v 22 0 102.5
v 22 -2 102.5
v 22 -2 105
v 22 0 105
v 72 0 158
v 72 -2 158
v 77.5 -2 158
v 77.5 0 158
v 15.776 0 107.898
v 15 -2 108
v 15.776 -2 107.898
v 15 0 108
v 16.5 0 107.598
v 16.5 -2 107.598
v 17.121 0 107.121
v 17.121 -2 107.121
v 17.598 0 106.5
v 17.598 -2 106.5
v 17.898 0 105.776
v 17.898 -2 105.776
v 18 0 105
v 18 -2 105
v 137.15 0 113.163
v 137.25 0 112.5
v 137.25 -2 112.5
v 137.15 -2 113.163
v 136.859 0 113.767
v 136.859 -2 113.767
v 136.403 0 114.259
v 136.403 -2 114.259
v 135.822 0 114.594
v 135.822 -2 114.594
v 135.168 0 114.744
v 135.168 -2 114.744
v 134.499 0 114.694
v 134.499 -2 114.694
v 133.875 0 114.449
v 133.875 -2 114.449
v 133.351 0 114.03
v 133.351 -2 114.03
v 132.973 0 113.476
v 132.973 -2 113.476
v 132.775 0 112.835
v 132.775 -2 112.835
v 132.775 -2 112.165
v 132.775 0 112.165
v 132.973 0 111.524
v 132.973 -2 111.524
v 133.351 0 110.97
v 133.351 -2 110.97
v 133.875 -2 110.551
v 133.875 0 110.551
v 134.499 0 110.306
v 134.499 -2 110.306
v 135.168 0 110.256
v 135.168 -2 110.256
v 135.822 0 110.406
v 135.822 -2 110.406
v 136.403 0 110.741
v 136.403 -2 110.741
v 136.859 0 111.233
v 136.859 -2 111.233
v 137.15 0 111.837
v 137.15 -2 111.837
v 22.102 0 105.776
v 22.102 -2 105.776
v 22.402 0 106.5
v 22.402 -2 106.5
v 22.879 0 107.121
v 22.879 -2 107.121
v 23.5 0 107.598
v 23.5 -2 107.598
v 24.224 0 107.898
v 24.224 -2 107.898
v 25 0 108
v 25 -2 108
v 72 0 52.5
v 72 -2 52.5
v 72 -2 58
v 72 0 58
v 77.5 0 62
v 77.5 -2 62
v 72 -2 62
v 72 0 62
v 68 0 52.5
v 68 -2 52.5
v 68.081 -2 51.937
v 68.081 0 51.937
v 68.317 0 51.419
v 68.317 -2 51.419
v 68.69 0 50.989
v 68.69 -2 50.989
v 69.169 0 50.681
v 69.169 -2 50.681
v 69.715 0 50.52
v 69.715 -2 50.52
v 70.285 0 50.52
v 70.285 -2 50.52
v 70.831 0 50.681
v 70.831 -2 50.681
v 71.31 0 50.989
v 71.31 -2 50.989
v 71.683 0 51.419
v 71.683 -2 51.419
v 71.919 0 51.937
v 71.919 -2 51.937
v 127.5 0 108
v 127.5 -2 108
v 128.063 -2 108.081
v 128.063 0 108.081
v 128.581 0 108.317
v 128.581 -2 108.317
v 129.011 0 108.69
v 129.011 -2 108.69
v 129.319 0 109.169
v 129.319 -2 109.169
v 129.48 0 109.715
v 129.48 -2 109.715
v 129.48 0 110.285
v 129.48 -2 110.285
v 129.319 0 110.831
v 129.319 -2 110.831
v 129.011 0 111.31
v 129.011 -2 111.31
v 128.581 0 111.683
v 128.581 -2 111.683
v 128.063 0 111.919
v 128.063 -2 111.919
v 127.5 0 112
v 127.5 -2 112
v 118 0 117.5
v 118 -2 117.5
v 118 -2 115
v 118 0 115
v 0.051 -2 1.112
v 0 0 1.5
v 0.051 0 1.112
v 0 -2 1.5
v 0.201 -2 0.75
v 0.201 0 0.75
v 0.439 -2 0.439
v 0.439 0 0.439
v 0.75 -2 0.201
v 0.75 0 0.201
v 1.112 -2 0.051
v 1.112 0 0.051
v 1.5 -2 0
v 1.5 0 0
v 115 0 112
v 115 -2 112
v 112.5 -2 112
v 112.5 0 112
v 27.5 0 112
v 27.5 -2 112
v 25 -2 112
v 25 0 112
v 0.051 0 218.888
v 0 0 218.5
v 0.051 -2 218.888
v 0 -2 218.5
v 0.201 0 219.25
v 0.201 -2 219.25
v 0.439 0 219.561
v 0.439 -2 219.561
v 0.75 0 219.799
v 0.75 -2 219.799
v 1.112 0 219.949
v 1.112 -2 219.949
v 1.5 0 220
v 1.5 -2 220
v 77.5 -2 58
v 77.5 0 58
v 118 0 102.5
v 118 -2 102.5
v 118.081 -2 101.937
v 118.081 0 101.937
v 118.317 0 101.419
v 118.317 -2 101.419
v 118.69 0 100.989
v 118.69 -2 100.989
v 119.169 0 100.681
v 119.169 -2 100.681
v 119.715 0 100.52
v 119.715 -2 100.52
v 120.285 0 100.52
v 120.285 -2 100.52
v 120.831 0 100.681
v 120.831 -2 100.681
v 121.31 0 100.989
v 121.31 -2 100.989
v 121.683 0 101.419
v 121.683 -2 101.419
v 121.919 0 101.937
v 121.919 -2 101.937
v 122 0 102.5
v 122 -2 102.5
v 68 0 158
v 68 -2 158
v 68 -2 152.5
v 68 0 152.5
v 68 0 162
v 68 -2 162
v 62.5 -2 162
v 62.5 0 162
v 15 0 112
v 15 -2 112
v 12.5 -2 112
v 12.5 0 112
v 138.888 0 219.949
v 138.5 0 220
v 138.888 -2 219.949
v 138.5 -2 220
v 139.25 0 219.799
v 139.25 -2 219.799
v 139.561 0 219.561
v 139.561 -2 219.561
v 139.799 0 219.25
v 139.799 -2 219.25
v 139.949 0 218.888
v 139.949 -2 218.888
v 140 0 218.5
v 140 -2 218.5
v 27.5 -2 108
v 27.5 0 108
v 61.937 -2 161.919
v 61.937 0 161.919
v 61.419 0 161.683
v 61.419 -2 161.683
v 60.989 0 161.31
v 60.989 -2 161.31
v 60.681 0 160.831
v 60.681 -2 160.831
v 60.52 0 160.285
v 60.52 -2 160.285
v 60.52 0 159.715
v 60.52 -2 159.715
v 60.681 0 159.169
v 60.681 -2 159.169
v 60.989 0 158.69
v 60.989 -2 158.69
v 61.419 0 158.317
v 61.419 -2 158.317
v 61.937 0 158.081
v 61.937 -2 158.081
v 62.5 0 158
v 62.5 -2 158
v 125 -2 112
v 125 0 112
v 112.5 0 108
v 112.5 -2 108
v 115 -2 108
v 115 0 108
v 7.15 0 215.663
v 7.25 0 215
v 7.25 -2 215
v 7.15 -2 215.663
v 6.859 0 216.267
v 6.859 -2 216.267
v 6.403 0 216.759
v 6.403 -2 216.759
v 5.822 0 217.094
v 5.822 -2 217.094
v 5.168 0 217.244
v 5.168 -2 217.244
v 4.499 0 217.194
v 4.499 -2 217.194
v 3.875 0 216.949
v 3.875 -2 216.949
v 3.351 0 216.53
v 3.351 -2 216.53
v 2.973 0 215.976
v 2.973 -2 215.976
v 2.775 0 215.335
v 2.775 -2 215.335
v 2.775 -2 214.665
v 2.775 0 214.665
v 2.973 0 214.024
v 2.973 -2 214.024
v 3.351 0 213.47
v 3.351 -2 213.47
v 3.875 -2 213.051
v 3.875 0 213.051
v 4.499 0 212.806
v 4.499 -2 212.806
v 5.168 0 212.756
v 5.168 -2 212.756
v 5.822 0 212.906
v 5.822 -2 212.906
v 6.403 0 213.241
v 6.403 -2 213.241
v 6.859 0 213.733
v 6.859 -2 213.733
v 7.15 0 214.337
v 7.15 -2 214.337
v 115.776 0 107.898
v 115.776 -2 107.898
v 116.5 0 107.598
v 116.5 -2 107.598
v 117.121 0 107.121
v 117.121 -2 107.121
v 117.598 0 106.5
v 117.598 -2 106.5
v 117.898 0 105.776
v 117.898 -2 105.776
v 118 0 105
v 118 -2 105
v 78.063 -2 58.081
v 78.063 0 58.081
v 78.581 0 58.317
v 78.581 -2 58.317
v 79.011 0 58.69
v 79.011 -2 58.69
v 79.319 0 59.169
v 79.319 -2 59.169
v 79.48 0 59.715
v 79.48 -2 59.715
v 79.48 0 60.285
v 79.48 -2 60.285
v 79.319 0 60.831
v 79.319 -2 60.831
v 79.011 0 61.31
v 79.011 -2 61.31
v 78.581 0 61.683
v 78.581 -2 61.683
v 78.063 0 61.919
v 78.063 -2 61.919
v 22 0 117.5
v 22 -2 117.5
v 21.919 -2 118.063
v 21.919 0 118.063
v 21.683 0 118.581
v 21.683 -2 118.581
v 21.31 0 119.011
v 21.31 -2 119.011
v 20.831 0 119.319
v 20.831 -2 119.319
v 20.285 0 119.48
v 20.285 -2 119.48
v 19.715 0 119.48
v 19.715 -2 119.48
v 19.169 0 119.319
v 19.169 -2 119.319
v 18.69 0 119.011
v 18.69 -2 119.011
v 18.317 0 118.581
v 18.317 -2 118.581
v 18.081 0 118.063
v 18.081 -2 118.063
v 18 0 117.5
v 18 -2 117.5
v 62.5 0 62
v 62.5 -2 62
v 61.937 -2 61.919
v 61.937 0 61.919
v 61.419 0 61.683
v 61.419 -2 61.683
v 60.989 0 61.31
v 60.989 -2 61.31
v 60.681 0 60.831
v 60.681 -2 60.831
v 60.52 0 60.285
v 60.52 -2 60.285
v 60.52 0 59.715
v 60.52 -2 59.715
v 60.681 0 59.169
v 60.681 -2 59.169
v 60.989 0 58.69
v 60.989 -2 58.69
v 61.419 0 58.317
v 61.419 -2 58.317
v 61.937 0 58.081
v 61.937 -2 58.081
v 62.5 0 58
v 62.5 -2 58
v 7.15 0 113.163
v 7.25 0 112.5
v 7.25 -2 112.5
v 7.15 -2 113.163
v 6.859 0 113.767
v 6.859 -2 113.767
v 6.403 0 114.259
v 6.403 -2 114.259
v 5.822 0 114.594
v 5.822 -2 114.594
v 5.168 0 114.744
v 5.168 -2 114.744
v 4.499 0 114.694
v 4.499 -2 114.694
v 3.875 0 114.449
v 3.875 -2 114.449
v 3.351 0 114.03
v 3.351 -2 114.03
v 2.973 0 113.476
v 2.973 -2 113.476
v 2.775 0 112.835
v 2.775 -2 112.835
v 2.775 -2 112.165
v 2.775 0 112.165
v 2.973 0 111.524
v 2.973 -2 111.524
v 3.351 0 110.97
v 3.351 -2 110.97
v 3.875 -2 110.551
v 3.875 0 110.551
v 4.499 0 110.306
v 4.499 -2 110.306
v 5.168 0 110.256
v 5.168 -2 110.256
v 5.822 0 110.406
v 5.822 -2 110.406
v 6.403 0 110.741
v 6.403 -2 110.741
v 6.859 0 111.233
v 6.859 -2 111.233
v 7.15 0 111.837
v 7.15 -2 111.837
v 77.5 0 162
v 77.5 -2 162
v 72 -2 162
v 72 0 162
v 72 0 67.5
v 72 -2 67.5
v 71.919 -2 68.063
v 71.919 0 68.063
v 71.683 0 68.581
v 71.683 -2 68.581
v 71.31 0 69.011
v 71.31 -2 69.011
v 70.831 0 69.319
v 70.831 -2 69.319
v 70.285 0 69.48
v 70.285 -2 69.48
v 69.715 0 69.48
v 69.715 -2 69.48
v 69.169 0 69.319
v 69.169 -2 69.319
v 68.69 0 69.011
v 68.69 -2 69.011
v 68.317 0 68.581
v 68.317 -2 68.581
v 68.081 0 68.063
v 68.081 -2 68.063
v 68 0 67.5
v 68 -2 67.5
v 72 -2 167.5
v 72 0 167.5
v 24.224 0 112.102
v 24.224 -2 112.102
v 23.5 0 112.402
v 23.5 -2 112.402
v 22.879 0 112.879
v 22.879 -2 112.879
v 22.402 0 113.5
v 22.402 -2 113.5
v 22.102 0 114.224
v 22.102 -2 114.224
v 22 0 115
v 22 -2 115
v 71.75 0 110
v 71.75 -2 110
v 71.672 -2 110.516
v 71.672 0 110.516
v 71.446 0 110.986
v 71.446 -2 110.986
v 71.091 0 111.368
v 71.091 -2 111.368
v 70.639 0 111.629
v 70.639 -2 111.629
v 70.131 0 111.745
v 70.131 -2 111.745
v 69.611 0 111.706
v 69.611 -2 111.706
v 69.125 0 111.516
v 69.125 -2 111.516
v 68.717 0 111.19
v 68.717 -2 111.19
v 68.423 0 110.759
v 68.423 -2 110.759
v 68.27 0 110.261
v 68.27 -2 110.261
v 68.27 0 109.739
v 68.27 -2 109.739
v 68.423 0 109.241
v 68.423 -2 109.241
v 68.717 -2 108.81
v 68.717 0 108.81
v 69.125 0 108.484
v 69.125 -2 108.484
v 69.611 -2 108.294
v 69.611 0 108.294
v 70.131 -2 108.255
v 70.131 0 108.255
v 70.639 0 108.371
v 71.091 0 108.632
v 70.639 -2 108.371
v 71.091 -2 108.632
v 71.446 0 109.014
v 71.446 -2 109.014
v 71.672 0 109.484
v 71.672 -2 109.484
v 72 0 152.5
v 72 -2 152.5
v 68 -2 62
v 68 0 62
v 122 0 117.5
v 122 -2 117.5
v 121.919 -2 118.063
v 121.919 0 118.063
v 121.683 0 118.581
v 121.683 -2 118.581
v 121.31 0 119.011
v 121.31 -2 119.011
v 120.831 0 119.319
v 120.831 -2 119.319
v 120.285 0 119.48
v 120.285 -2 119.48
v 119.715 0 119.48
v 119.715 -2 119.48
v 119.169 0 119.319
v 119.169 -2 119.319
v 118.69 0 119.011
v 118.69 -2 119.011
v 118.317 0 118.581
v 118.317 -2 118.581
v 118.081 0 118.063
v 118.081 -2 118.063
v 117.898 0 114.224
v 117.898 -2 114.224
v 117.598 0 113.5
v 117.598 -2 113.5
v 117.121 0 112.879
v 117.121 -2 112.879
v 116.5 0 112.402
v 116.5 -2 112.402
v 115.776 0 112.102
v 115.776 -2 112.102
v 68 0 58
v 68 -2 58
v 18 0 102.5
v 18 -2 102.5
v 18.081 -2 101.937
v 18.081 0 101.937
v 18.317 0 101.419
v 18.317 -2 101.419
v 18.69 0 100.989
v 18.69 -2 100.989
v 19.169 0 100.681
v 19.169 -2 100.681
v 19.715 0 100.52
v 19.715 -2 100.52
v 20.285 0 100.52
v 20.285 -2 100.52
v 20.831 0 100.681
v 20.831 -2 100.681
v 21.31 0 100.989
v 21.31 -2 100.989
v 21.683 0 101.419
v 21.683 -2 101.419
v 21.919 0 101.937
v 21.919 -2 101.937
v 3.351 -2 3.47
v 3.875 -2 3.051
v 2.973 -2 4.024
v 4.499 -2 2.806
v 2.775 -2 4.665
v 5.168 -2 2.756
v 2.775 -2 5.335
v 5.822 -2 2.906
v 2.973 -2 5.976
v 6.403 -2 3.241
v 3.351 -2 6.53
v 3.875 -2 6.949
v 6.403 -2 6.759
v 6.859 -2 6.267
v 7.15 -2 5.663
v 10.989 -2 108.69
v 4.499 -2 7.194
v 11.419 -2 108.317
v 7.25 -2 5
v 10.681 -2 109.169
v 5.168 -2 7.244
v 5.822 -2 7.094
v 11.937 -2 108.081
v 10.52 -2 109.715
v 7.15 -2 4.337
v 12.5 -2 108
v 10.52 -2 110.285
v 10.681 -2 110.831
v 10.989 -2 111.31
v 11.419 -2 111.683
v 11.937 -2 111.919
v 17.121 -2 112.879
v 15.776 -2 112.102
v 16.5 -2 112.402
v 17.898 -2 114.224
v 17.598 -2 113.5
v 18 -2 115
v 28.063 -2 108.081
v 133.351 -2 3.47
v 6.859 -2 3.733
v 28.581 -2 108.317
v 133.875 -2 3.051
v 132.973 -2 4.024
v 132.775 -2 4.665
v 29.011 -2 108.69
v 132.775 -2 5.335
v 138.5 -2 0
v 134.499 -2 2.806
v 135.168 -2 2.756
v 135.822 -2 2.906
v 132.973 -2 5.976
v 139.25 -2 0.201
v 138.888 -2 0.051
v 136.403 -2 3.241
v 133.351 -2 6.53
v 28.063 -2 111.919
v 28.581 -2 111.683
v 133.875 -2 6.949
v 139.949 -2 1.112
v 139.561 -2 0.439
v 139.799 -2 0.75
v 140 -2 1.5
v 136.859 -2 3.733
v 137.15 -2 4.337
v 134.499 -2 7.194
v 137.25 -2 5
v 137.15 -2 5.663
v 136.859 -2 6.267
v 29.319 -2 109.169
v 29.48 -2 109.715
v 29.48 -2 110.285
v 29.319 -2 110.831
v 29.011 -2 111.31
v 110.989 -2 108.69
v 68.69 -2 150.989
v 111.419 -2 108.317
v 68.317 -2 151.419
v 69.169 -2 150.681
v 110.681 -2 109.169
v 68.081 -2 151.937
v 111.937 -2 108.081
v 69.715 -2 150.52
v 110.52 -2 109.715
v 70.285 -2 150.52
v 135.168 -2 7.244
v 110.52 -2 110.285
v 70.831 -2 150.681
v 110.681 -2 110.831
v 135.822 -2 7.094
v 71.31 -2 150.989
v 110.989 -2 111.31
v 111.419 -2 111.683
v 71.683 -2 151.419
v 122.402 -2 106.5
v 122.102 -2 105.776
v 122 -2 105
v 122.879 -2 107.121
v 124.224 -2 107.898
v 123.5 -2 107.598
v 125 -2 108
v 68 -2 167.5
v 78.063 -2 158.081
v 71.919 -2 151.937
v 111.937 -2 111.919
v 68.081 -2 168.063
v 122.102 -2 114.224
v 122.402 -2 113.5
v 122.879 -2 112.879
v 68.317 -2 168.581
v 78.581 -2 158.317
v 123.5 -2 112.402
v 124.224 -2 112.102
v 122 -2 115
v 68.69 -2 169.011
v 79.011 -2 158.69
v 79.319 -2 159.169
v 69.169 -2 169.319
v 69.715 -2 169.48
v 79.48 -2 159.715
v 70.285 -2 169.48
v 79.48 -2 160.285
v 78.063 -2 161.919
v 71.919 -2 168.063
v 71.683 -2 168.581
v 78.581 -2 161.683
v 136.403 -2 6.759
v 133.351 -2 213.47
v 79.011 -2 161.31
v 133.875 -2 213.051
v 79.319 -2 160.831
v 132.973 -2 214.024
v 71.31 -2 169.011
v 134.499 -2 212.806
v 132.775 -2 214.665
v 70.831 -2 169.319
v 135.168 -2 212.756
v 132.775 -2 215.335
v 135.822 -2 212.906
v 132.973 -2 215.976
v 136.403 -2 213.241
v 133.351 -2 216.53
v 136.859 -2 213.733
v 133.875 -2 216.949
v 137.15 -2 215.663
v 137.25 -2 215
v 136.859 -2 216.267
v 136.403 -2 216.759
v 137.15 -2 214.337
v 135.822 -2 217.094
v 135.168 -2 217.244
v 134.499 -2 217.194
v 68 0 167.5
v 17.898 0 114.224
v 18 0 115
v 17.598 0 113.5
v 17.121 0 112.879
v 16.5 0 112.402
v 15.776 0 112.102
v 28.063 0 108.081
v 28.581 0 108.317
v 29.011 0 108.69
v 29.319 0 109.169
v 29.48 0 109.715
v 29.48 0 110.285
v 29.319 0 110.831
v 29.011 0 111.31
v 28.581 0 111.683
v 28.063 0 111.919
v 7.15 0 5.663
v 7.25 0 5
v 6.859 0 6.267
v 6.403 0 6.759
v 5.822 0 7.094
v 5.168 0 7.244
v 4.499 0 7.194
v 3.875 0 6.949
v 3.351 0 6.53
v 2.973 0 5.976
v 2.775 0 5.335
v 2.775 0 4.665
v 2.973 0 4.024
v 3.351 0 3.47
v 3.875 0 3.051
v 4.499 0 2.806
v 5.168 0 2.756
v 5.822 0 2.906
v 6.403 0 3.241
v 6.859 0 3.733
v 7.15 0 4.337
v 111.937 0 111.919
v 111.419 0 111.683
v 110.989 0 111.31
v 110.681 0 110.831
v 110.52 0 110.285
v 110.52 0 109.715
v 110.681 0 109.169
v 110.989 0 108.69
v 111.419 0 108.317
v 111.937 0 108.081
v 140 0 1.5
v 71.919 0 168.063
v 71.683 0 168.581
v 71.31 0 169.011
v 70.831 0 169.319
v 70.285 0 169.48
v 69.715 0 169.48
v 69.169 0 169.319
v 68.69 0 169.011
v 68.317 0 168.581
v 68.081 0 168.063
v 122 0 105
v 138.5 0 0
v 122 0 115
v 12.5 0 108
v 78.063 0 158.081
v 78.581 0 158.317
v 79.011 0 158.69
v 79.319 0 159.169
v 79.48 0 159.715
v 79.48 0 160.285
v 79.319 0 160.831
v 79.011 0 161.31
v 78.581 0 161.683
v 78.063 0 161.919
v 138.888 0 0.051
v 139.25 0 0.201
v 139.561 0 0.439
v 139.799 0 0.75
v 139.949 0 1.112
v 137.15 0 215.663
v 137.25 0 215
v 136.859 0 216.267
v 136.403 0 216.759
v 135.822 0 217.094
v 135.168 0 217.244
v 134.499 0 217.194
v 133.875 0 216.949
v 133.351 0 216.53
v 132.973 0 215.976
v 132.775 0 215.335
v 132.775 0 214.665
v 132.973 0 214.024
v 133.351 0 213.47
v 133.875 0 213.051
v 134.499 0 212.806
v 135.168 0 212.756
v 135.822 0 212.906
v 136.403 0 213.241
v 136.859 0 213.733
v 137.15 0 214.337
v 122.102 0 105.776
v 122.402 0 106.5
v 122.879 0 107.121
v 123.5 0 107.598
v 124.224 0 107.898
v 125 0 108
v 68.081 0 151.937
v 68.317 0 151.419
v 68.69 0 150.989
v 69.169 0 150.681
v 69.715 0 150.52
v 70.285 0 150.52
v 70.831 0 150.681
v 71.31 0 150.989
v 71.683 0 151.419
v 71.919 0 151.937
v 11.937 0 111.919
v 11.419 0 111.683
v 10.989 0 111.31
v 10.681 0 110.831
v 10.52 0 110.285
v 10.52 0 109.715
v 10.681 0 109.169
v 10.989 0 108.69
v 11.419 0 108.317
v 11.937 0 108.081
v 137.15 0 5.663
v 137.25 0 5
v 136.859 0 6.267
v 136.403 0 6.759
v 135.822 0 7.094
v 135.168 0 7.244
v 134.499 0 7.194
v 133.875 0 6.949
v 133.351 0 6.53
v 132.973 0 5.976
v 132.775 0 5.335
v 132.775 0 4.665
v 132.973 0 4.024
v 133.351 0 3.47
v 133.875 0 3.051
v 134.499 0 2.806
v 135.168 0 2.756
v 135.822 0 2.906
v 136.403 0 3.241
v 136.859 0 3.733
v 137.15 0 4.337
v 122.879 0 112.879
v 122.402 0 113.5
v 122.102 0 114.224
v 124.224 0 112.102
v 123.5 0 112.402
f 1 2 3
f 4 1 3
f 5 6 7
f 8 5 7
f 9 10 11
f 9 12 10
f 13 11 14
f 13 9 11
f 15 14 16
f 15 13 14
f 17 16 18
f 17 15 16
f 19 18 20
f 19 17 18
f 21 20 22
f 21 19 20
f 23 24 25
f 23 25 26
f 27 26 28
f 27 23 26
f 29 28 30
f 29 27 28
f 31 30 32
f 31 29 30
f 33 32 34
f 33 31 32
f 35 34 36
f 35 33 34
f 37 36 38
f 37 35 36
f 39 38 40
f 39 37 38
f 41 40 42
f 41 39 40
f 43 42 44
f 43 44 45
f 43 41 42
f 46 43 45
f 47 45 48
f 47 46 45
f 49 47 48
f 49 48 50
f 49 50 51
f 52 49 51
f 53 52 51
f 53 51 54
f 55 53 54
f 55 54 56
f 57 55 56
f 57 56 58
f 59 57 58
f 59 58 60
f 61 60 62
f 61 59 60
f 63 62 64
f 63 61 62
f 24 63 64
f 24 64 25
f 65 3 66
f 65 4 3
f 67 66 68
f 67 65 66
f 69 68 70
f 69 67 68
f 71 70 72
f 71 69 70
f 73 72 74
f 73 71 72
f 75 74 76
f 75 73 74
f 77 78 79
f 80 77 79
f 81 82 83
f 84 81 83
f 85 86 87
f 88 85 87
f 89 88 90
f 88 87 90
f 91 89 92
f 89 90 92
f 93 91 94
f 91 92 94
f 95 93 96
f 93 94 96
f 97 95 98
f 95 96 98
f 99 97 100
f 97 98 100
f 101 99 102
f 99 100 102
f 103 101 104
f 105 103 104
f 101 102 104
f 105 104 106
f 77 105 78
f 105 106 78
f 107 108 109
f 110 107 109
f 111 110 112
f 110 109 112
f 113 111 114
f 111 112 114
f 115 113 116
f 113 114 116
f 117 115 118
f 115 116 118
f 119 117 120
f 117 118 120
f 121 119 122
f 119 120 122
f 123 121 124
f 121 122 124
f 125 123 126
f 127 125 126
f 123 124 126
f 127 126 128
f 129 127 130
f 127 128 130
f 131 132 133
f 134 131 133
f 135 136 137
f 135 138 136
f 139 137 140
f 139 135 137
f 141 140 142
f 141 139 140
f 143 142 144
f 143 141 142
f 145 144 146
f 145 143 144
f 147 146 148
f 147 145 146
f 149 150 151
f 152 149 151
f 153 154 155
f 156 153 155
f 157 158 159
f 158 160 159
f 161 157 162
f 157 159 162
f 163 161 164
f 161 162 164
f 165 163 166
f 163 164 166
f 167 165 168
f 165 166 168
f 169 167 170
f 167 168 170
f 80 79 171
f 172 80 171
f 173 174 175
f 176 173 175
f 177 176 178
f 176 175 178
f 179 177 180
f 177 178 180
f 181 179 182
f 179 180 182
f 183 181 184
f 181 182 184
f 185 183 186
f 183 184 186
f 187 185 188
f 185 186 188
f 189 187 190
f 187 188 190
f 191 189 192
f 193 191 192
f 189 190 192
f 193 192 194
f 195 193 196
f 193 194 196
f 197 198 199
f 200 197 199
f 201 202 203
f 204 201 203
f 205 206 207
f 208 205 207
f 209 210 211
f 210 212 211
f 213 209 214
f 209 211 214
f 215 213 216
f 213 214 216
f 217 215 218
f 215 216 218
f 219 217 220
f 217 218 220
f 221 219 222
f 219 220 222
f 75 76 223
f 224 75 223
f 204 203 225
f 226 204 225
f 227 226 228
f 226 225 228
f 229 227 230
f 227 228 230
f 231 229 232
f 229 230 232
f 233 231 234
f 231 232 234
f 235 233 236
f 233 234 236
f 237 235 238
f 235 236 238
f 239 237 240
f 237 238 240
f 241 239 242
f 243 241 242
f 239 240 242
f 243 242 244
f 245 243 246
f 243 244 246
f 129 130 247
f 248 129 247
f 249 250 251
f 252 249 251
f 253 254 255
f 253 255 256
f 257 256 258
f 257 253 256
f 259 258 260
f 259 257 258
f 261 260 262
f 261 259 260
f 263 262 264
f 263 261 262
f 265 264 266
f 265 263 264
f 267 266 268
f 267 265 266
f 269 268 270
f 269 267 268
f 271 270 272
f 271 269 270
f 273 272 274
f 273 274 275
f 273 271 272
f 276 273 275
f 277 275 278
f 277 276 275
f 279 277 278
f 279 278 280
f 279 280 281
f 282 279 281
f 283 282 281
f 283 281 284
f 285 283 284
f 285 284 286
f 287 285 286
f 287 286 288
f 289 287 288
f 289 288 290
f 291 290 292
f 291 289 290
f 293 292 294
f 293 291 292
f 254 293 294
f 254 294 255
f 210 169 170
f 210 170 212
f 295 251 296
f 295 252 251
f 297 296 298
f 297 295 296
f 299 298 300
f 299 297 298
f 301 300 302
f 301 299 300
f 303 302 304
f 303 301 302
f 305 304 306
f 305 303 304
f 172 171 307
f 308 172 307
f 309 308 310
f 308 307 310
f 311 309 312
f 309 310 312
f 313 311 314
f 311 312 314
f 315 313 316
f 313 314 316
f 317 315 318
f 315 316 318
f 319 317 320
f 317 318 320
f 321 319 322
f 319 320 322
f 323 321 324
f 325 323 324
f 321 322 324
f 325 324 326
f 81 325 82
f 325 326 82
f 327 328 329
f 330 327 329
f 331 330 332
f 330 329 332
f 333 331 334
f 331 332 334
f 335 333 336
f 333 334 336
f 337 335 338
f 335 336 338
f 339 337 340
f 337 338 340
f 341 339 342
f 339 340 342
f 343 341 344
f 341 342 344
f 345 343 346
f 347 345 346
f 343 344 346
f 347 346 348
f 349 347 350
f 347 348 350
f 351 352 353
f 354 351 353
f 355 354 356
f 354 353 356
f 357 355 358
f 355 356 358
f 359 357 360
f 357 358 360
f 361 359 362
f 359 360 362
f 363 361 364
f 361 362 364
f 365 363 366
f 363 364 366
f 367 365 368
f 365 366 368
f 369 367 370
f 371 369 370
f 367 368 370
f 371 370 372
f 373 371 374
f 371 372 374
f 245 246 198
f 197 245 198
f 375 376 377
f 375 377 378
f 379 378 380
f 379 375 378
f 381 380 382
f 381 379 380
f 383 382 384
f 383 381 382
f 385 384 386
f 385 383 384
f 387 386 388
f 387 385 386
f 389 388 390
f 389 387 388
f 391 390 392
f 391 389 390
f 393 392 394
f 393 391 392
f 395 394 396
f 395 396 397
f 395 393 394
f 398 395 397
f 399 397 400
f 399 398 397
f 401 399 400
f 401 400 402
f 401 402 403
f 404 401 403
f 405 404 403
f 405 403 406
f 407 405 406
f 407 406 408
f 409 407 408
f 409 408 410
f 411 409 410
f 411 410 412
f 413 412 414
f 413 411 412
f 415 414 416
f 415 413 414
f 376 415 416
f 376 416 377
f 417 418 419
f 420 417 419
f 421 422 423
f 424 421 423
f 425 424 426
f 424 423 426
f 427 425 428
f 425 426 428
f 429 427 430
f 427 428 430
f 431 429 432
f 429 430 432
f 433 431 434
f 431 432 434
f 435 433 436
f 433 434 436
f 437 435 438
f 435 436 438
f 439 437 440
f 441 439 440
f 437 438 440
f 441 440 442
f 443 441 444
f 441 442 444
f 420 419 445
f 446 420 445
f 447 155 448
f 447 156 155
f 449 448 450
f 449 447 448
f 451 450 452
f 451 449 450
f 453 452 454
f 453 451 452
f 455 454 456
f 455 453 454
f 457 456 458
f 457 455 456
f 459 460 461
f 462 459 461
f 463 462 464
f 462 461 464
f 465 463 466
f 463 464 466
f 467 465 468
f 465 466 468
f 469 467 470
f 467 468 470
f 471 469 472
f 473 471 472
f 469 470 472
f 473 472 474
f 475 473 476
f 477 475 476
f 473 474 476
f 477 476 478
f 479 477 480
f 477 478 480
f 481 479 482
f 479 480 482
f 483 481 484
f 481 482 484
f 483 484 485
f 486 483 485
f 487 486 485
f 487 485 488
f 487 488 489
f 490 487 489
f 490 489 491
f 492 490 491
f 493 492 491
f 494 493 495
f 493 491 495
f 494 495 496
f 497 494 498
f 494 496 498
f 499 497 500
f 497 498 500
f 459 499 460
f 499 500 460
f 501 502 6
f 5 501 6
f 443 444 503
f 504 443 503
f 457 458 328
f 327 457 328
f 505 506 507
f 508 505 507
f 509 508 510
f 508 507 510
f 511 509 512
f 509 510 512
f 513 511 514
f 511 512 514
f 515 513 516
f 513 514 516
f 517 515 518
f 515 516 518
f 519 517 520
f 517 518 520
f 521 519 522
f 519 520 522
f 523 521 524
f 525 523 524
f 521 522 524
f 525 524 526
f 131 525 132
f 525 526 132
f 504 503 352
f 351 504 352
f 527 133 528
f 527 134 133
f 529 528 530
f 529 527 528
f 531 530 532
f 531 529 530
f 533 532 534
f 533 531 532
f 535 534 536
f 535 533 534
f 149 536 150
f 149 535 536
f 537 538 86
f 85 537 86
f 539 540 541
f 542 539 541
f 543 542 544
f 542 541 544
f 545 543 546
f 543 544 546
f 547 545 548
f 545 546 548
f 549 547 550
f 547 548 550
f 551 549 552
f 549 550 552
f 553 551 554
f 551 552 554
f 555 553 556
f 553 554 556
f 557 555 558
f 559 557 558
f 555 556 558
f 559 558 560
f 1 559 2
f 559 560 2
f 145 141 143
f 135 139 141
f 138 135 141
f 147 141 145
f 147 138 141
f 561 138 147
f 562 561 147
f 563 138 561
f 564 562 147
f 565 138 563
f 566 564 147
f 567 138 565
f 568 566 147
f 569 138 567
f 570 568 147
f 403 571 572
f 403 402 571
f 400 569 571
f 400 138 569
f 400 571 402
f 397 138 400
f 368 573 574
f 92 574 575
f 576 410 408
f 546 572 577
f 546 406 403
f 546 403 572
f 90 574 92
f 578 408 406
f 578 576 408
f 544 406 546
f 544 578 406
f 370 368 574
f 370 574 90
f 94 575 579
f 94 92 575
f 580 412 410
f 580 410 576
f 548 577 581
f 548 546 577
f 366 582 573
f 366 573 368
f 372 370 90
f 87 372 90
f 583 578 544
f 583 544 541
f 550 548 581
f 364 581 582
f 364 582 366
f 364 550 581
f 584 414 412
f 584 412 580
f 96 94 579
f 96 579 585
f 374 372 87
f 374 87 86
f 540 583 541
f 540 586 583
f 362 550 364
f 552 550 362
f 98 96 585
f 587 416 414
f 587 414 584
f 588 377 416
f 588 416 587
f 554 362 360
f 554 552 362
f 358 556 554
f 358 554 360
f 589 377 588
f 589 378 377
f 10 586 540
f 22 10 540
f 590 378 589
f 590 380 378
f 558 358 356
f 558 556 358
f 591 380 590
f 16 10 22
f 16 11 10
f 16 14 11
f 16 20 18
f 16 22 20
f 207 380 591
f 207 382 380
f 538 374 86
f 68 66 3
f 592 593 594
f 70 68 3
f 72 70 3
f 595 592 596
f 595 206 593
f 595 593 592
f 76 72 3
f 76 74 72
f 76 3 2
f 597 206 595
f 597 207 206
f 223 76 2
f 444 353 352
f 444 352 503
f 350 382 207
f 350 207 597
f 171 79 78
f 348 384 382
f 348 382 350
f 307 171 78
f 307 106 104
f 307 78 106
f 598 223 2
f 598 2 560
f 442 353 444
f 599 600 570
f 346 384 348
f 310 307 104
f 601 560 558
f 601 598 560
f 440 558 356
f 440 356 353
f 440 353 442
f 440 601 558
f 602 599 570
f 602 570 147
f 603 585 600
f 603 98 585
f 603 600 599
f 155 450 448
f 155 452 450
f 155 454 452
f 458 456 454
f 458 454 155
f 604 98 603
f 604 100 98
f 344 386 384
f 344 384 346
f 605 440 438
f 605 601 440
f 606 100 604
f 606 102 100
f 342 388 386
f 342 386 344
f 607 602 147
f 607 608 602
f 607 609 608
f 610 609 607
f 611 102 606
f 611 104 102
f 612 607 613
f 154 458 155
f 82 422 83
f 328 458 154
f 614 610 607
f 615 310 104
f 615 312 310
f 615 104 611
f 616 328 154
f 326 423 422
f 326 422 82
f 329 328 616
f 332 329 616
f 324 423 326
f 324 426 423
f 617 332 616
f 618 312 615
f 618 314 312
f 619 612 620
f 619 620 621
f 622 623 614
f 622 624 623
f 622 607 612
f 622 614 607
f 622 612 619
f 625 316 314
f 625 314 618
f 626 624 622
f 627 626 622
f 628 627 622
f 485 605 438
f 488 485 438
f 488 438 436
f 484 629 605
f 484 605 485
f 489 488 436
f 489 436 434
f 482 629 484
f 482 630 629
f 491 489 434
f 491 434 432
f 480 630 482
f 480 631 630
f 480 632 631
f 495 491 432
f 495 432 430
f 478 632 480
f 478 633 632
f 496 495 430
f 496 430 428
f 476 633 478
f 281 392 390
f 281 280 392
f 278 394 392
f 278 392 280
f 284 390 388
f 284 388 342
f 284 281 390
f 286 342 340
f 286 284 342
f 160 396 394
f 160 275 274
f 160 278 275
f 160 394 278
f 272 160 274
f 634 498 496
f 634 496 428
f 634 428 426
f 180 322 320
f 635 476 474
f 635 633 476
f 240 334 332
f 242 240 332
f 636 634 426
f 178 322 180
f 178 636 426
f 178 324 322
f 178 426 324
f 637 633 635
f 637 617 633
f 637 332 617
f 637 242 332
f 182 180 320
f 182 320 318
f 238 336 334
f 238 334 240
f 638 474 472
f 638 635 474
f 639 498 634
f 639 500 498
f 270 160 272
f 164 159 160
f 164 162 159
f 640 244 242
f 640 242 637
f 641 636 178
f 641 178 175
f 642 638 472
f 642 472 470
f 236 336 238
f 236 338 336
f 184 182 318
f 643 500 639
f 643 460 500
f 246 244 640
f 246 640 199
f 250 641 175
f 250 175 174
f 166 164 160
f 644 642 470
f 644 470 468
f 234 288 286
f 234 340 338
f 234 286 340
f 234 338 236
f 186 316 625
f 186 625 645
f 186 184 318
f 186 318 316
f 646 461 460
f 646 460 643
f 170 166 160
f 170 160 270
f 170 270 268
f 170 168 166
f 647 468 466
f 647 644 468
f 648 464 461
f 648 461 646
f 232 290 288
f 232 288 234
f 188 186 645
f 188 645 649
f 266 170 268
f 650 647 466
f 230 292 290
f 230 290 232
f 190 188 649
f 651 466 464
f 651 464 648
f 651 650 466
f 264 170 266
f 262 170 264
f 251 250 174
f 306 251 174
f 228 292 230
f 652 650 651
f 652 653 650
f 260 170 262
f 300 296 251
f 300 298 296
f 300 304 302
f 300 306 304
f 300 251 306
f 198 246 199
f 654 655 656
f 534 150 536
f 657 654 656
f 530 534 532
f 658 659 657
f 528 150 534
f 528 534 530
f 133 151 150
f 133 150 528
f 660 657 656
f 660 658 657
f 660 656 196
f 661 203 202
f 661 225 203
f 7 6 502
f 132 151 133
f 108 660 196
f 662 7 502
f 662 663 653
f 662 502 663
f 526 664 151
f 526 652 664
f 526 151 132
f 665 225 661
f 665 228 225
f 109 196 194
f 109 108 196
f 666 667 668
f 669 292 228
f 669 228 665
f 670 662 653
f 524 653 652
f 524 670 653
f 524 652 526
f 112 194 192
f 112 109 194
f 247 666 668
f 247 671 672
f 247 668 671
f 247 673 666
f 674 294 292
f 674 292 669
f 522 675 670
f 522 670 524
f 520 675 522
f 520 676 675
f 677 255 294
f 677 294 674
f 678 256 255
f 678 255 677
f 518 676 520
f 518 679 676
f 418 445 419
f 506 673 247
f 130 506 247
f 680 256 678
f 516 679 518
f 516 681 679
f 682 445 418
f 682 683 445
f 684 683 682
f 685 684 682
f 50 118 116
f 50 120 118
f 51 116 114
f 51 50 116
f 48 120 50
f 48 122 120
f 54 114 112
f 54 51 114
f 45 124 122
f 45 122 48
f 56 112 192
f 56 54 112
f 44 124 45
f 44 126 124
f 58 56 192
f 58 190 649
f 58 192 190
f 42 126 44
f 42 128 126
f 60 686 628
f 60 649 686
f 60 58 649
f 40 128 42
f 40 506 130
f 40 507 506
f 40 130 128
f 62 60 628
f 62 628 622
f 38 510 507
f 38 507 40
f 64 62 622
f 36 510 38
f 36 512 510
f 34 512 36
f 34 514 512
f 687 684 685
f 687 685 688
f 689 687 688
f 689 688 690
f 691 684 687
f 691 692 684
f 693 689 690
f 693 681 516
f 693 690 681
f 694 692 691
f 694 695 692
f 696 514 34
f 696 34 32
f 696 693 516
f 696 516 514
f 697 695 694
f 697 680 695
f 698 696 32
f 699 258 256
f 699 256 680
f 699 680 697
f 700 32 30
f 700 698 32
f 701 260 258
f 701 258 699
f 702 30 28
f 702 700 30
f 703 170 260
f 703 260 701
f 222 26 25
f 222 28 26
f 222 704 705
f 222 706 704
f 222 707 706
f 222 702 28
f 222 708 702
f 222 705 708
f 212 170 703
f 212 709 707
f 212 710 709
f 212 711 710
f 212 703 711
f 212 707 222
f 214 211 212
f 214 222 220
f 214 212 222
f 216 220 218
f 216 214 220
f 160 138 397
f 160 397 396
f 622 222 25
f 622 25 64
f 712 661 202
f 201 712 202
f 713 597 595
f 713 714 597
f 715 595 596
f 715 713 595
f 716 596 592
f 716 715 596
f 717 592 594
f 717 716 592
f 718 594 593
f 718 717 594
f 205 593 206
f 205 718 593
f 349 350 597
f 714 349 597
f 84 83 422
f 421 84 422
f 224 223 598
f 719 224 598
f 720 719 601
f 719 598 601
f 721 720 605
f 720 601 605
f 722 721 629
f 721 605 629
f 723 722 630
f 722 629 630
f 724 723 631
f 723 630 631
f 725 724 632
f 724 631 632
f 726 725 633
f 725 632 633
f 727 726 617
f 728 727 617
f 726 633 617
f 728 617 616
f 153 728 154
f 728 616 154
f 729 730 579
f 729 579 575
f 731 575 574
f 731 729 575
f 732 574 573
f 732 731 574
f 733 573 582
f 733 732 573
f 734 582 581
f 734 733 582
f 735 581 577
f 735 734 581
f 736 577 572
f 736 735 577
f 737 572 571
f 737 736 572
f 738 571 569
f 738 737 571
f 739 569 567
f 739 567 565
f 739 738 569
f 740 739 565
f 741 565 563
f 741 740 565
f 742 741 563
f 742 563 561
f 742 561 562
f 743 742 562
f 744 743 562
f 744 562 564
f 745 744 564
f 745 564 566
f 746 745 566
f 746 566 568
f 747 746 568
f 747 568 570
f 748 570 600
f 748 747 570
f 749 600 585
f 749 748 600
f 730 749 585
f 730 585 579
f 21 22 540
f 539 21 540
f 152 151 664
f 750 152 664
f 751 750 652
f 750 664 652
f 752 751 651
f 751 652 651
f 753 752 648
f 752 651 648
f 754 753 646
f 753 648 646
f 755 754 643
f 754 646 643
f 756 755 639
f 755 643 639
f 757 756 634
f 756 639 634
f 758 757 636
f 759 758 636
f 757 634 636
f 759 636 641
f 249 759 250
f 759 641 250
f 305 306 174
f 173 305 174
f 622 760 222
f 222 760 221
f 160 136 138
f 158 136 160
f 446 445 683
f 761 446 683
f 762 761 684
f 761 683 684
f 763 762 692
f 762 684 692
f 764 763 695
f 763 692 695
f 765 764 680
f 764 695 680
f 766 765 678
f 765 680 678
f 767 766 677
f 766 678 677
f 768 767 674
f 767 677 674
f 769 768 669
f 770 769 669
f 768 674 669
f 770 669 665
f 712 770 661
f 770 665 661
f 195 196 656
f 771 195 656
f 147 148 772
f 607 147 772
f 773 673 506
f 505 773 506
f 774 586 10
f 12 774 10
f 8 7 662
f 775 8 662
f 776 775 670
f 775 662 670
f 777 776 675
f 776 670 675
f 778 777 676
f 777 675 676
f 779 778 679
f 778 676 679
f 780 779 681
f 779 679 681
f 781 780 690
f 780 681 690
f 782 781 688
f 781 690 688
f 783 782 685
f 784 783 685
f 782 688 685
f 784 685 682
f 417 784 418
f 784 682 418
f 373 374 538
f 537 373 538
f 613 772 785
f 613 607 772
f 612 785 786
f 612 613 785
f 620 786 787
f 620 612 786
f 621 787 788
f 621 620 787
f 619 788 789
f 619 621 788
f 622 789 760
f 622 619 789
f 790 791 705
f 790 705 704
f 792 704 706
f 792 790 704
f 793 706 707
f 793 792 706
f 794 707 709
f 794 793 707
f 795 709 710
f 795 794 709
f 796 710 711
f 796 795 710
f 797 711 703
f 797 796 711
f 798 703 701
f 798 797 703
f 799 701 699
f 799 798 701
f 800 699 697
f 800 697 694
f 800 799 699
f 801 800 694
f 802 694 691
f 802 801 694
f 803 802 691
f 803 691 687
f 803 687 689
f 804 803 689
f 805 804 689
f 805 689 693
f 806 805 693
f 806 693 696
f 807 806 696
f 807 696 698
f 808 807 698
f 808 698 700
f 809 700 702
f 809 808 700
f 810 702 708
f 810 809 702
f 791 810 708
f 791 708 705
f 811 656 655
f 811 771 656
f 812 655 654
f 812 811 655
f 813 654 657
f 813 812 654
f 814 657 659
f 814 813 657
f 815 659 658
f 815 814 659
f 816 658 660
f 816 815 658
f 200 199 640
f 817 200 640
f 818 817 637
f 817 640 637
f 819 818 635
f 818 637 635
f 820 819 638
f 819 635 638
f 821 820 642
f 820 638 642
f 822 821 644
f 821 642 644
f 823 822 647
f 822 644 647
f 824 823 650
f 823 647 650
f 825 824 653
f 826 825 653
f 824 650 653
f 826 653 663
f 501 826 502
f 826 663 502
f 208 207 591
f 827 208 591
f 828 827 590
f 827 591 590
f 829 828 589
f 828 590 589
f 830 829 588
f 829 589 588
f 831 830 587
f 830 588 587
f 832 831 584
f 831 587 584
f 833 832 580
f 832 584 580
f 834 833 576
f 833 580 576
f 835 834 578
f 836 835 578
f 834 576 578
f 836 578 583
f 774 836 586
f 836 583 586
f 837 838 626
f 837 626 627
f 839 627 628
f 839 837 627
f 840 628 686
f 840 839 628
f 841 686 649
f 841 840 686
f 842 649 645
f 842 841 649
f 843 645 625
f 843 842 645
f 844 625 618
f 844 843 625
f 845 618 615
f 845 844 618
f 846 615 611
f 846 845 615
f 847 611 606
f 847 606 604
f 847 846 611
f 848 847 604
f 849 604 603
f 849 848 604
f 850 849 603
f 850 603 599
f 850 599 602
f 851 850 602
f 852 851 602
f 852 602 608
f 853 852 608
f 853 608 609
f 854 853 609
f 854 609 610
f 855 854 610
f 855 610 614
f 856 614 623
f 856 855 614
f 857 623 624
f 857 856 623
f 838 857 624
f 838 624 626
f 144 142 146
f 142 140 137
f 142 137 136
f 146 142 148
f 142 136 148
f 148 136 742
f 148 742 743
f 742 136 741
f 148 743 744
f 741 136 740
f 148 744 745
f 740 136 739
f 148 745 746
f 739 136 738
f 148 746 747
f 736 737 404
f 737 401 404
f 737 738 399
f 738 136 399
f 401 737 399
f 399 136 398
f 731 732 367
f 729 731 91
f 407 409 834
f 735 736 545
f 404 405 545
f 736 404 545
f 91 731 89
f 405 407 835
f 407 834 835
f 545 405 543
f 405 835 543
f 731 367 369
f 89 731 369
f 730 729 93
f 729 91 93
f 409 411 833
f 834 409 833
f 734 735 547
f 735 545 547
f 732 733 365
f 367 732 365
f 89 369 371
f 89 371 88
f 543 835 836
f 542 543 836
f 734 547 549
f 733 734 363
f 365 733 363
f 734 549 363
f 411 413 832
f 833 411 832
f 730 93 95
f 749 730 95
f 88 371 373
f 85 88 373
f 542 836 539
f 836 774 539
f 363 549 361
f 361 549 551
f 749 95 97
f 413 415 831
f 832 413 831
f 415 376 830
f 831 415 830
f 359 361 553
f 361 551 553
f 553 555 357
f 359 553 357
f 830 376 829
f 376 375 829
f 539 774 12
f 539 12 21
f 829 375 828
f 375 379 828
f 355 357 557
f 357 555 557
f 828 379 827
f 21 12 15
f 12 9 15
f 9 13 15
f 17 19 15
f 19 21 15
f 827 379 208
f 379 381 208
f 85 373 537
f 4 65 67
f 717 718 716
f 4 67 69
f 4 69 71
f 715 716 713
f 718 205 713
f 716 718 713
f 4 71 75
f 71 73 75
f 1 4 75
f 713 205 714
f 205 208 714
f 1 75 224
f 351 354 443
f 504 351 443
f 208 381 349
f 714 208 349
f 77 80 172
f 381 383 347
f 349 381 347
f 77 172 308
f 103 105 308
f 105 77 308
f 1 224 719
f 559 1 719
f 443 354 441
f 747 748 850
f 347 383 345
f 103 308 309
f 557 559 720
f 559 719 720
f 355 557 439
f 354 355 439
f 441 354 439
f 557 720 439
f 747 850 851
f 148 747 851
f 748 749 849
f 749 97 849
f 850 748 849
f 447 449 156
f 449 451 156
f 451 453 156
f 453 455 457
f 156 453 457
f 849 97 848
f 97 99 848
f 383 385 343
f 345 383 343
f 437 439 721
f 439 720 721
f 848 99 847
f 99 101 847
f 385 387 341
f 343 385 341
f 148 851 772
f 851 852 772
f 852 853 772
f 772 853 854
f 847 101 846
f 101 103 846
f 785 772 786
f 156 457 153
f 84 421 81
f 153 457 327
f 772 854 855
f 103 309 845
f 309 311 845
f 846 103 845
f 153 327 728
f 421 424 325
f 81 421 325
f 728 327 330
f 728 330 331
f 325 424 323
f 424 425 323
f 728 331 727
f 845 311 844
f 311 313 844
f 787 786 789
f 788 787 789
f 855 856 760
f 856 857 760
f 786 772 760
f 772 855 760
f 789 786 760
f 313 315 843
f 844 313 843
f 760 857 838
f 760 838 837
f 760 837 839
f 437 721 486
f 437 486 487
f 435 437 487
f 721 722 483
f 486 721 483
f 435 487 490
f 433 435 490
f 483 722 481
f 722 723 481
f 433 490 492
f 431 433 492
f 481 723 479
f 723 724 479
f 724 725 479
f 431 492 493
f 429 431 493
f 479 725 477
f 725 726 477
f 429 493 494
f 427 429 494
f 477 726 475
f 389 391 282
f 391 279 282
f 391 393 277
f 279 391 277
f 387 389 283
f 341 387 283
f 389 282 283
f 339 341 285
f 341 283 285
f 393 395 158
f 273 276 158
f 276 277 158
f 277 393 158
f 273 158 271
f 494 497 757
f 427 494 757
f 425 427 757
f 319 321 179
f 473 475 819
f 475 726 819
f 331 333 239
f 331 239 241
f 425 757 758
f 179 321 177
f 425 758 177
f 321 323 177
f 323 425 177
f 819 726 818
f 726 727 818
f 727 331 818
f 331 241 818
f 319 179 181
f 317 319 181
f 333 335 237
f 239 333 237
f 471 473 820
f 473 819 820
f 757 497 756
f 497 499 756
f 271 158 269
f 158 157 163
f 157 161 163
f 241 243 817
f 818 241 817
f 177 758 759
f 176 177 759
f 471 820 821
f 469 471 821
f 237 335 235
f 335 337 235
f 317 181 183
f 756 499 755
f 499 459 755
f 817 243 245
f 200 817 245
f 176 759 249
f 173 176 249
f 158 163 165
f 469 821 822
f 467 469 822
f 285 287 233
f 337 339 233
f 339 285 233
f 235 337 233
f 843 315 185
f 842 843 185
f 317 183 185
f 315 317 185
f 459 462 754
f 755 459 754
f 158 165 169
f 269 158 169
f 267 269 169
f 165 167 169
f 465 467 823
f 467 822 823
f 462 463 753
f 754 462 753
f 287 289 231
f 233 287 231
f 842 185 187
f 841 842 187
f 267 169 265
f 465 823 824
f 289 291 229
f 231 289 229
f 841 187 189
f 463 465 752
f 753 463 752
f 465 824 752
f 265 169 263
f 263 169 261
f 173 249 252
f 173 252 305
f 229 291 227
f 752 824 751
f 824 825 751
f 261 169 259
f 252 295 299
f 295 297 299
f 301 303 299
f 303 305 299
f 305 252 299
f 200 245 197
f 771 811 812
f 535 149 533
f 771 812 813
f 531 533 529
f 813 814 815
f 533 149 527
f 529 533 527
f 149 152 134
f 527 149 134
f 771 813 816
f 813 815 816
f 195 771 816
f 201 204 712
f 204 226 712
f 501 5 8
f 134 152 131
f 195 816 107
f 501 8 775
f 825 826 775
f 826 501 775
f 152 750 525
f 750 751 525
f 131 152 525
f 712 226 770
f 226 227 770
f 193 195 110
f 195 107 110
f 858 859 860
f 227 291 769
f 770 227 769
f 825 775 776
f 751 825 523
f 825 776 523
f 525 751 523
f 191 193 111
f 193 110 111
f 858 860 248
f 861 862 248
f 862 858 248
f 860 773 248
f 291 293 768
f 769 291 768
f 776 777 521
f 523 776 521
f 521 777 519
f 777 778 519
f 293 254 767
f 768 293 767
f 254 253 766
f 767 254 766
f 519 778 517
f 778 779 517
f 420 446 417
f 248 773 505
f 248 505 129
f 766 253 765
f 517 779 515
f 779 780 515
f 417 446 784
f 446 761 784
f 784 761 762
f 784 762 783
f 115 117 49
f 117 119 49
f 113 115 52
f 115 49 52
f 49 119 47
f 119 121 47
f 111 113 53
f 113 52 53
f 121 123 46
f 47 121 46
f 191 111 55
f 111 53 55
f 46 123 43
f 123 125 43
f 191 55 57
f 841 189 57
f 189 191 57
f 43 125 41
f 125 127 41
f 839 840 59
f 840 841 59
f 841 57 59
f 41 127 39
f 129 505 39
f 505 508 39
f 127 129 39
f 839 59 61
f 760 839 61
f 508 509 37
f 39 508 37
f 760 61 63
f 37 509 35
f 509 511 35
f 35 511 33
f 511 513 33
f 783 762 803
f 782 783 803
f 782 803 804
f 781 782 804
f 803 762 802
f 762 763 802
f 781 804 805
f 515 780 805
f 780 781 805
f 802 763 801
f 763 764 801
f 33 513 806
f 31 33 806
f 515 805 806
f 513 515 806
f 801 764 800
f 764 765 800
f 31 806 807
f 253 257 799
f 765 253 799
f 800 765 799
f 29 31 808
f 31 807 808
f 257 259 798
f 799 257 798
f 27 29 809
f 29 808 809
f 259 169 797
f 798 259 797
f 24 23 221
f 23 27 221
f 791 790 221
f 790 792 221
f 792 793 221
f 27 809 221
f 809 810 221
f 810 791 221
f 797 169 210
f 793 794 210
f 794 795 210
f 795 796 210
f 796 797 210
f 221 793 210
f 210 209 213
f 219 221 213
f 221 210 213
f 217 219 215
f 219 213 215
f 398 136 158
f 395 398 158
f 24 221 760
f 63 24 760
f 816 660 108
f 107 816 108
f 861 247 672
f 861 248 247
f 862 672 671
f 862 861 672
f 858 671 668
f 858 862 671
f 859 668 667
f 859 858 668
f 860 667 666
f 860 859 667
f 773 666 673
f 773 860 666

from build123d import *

# Parameters (mm, degrees)
F0_W     = 140
F0_H     = 220
F0_R     = 2.25
F1_DEPTH = 2
F2_W     = 2
F2_H     = 2
F2_R     = 1.75
F3_DEPTH = 2
F4_R     = 3
F5_R     = 1.5


with BuildPart() as f1:
    # F0 (on Front) → F1 (new body)
    with BuildSketch(Plane.XZ):
        with Locations((70, 110)):
            Rectangle(F0_W, F0_H)
        with Locations((5, 5)):
            Circle(F0_R, mode=Mode.SUBTRACT)
        with Locations((135, 5)):
            Circle(F0_R, mode=Mode.SUBTRACT)
        with Locations((5, 112.5)):
            Circle(F0_R, mode=Mode.SUBTRACT)
        with Locations((5, 215)):
            Circle(F0_R, mode=Mode.SUBTRACT)
        with Locations((135, 112.5)):
            Circle(F0_R, mode=Mode.SUBTRACT)
        with Locations((135, 215)):
            Circle(F0_R, mode=Mode.SUBTRACT)
    extrude(amount=F1_DEPTH)

    # F2 (on face) → F3 (cut)
    with BuildSketch(Plane.XZ.offset(2)):
        with Locations((21, 111)):
            Rectangle(F2_W, F2_H)
        with Locations((19, 111)):
            Rectangle(F2_W, F2_H)
        with BuildLine():
            Line((18, 112), (20, 112))
            Line((20, 112), (22, 112))
            Line((22, 112), (22, 117.5))
            ThreePointArc((22, 117.5), (20, 119.5), (18, 117.5))
            Line((18, 117.5), (18, 112))
        make_face()
        with Locations((21, 109)):
            Rectangle(F2_W, F2_H)
        with Locations((19, 109)):
            Rectangle(F2_W, F2_H)
        with BuildLine():
            Line((18, 110), (18, 112))
            Line((18, 112), (12.5, 112))
            ThreePointArc((12.5, 112), (10.5, 110), (12.5, 108))
            Line((12.5, 108), (18, 108))
            Line((18, 108), (18, 110))
        make_face()
        with BuildLine():
            Line((27.5, 112), (22, 112))
            Line((22, 112), (22, 110))
            Line((22, 110), (22, 108))
            Line((22, 108), (27.5, 108))
            ThreePointArc((27.5, 108), (29.5, 110), (27.5, 112))
        make_face()
        with BuildLine():
            Line((22, 108), (20, 108))
            Line((20, 108), (18, 108))
            Line((18, 108), (18, 102.5))
            ThreePointArc((18, 102.5), (20, 100.5), (22, 102.5))
            Line((22, 102.5), (22, 108))
        make_face()
        with Locations((121, 111)):
            Rectangle(F2_W, F2_H)
        with Locations((119, 111)):
            Rectangle(F2_W, F2_H)
        with BuildLine():
            Line((118, 112), (120, 112))
            Line((120, 112), (122, 112))
            Line((122, 112), (122, 117.5))
            ThreePointArc((122, 117.5), (120, 119.5), (118, 117.5))
            Line((118, 117.5), (118, 112))
        make_face()
        with Locations((121, 109)):
            Rectangle(F2_W, F2_H)
        with Locations((119, 109)):
            Rectangle(F2_W, F2_H)
        with BuildLine():
            Line((118, 110), (118, 112))
            Line((118, 112), (112.5, 112))
            ThreePointArc((112.5, 112), (110.5, 110), (112.5, 108))
            Line((112.5, 108), (118, 108))
            Line((118, 108), (118, 110))
        make_face()
        with BuildLine():
            Line((127.5, 112), (122, 112))
            Line((122, 112), (122, 110))
            Line((122, 110), (122, 108))
            Line((122, 108), (127.5, 108))
            ThreePointArc((127.5, 108), (129.5, 110), (127.5, 112))
        make_face()
        with BuildLine():
            Line((122, 108), (120, 108))
            Line((120, 108), (118, 108))
            Line((118, 108), (118, 102.5))
            ThreePointArc((118, 102.5), (120, 100.5), (122, 102.5))
            Line((122, 102.5), (122, 108))
        make_face()
        with Locations((70, 110)):
            Circle(F2_R)
        with Locations((71, 161)):
            Rectangle(F2_W, F2_H)
        with BuildLine():
            Line((68, 162), (70, 162))
            Line((70, 162), (72, 162))
            Line((72, 162), (72, 167.5))
            ThreePointArc((72, 167.5), (70, 169.5), (68, 167.5))
            Line((68, 167.5), (68, 162))
        make_face()
        with Locations((69, 161)):
            Rectangle(F2_W, F2_H)
        with Locations((71, 159)):
            Rectangle(F2_W, F2_H)
        with Locations((69, 159)):
            Rectangle(F2_W, F2_H)
        with BuildLine():
            Line((77.5, 162), (72, 162))
            Line((72, 162), (72, 160))
            Line((72, 160), (72, 158))
            Line((72, 158), (77.5, 158))
            ThreePointArc((77.5, 158), (79.5, 160), (77.5, 162))
        make_face()
        with BuildLine():
            Line((68, 160), (68, 162))
            Line((68, 162), (62.5, 162))
            ThreePointArc((62.5, 162), (60.5, 160), (62.5, 158))
            Line((62.5, 158), (68, 158))
            Line((68, 158), (68, 160))
        make_face()
        with BuildLine():
            Line((72, 158), (70, 158))
            Line((70, 158), (68, 158))
            Line((68, 158), (68, 152.5))
            ThreePointArc((68, 152.5), (70, 150.5), (72, 152.5))
            Line((72, 152.5), (72, 158))
        make_face()
        with BuildLine():
            ThreePointArc((77.5, 58), (79.5, 60), (77.5, 62))
            Line((77.5, 62), (72, 62))
            Line((72, 62), (72, 60))
            Line((72, 60), (72, 58))
            Line((72, 58), (77.5, 58))
        make_face()
        with Locations((71, 61)):
            Rectangle(F2_W, F2_H)
        with BuildLine():
            Line((70, 62), (72, 62))
            Line((72, 62), (72, 67.5))
            ThreePointArc((72, 67.5), (70, 69.5), (68, 67.5))
            Line((68, 67.5), (68, 62))
            Line((68, 62), (70, 62))
        make_face()
        with Locations((69, 61)):
            Rectangle(F2_W, F2_H)
        with Locations((71, 59)):
            Rectangle(F2_W, F2_H)
        with BuildLine():
            Line((72, 52.5), (72, 58))
            Line((72, 58), (70, 58))
            Line((70, 58), (68, 58))
            Line((68, 58), (68, 52.5))
            ThreePointArc((68, 52.5), (70, 50.5), (72, 52.5))
        make_face()
        with BuildLine():
            Line((68, 60), (68, 62))
            Line((68, 62), (62.5, 62))
            ThreePointArc((62.5, 62), (60.5, 60), (62.5, 58))
            Line((62.5, 58), (68, 58))
            Line((68, 58), (68, 60))
        make_face()
        with Locations((69, 59)):
            Rectangle(F2_W, F2_H)
    extrude(amount=-F3_DEPTH, mode=Mode.SUBTRACT)

    # F4
    f4_edges = [f1.edges().sort_by_distance(p)[0] for p in [
        (18, -1, 112),
        (22, -1, 112),
        (18, -1, 108),
        (22, -1, 108),
        (118, -1, 112),
        (122, -1, 112),
        (118, -1, 108),
        (122, -1, 108),
    ]]
    fillet(f4_edges, radius=F4_R)

    # F5
    f5_edges = [f1.edges().sort_by_distance(p)[0] for p in [
        (0, -1, 220),
        (140, -1, 220),
        (0, -1, 0),
        (140, -1, 0),
    ]]
    fillet(f5_edges, radius=F5_R)


solid = f1.part
